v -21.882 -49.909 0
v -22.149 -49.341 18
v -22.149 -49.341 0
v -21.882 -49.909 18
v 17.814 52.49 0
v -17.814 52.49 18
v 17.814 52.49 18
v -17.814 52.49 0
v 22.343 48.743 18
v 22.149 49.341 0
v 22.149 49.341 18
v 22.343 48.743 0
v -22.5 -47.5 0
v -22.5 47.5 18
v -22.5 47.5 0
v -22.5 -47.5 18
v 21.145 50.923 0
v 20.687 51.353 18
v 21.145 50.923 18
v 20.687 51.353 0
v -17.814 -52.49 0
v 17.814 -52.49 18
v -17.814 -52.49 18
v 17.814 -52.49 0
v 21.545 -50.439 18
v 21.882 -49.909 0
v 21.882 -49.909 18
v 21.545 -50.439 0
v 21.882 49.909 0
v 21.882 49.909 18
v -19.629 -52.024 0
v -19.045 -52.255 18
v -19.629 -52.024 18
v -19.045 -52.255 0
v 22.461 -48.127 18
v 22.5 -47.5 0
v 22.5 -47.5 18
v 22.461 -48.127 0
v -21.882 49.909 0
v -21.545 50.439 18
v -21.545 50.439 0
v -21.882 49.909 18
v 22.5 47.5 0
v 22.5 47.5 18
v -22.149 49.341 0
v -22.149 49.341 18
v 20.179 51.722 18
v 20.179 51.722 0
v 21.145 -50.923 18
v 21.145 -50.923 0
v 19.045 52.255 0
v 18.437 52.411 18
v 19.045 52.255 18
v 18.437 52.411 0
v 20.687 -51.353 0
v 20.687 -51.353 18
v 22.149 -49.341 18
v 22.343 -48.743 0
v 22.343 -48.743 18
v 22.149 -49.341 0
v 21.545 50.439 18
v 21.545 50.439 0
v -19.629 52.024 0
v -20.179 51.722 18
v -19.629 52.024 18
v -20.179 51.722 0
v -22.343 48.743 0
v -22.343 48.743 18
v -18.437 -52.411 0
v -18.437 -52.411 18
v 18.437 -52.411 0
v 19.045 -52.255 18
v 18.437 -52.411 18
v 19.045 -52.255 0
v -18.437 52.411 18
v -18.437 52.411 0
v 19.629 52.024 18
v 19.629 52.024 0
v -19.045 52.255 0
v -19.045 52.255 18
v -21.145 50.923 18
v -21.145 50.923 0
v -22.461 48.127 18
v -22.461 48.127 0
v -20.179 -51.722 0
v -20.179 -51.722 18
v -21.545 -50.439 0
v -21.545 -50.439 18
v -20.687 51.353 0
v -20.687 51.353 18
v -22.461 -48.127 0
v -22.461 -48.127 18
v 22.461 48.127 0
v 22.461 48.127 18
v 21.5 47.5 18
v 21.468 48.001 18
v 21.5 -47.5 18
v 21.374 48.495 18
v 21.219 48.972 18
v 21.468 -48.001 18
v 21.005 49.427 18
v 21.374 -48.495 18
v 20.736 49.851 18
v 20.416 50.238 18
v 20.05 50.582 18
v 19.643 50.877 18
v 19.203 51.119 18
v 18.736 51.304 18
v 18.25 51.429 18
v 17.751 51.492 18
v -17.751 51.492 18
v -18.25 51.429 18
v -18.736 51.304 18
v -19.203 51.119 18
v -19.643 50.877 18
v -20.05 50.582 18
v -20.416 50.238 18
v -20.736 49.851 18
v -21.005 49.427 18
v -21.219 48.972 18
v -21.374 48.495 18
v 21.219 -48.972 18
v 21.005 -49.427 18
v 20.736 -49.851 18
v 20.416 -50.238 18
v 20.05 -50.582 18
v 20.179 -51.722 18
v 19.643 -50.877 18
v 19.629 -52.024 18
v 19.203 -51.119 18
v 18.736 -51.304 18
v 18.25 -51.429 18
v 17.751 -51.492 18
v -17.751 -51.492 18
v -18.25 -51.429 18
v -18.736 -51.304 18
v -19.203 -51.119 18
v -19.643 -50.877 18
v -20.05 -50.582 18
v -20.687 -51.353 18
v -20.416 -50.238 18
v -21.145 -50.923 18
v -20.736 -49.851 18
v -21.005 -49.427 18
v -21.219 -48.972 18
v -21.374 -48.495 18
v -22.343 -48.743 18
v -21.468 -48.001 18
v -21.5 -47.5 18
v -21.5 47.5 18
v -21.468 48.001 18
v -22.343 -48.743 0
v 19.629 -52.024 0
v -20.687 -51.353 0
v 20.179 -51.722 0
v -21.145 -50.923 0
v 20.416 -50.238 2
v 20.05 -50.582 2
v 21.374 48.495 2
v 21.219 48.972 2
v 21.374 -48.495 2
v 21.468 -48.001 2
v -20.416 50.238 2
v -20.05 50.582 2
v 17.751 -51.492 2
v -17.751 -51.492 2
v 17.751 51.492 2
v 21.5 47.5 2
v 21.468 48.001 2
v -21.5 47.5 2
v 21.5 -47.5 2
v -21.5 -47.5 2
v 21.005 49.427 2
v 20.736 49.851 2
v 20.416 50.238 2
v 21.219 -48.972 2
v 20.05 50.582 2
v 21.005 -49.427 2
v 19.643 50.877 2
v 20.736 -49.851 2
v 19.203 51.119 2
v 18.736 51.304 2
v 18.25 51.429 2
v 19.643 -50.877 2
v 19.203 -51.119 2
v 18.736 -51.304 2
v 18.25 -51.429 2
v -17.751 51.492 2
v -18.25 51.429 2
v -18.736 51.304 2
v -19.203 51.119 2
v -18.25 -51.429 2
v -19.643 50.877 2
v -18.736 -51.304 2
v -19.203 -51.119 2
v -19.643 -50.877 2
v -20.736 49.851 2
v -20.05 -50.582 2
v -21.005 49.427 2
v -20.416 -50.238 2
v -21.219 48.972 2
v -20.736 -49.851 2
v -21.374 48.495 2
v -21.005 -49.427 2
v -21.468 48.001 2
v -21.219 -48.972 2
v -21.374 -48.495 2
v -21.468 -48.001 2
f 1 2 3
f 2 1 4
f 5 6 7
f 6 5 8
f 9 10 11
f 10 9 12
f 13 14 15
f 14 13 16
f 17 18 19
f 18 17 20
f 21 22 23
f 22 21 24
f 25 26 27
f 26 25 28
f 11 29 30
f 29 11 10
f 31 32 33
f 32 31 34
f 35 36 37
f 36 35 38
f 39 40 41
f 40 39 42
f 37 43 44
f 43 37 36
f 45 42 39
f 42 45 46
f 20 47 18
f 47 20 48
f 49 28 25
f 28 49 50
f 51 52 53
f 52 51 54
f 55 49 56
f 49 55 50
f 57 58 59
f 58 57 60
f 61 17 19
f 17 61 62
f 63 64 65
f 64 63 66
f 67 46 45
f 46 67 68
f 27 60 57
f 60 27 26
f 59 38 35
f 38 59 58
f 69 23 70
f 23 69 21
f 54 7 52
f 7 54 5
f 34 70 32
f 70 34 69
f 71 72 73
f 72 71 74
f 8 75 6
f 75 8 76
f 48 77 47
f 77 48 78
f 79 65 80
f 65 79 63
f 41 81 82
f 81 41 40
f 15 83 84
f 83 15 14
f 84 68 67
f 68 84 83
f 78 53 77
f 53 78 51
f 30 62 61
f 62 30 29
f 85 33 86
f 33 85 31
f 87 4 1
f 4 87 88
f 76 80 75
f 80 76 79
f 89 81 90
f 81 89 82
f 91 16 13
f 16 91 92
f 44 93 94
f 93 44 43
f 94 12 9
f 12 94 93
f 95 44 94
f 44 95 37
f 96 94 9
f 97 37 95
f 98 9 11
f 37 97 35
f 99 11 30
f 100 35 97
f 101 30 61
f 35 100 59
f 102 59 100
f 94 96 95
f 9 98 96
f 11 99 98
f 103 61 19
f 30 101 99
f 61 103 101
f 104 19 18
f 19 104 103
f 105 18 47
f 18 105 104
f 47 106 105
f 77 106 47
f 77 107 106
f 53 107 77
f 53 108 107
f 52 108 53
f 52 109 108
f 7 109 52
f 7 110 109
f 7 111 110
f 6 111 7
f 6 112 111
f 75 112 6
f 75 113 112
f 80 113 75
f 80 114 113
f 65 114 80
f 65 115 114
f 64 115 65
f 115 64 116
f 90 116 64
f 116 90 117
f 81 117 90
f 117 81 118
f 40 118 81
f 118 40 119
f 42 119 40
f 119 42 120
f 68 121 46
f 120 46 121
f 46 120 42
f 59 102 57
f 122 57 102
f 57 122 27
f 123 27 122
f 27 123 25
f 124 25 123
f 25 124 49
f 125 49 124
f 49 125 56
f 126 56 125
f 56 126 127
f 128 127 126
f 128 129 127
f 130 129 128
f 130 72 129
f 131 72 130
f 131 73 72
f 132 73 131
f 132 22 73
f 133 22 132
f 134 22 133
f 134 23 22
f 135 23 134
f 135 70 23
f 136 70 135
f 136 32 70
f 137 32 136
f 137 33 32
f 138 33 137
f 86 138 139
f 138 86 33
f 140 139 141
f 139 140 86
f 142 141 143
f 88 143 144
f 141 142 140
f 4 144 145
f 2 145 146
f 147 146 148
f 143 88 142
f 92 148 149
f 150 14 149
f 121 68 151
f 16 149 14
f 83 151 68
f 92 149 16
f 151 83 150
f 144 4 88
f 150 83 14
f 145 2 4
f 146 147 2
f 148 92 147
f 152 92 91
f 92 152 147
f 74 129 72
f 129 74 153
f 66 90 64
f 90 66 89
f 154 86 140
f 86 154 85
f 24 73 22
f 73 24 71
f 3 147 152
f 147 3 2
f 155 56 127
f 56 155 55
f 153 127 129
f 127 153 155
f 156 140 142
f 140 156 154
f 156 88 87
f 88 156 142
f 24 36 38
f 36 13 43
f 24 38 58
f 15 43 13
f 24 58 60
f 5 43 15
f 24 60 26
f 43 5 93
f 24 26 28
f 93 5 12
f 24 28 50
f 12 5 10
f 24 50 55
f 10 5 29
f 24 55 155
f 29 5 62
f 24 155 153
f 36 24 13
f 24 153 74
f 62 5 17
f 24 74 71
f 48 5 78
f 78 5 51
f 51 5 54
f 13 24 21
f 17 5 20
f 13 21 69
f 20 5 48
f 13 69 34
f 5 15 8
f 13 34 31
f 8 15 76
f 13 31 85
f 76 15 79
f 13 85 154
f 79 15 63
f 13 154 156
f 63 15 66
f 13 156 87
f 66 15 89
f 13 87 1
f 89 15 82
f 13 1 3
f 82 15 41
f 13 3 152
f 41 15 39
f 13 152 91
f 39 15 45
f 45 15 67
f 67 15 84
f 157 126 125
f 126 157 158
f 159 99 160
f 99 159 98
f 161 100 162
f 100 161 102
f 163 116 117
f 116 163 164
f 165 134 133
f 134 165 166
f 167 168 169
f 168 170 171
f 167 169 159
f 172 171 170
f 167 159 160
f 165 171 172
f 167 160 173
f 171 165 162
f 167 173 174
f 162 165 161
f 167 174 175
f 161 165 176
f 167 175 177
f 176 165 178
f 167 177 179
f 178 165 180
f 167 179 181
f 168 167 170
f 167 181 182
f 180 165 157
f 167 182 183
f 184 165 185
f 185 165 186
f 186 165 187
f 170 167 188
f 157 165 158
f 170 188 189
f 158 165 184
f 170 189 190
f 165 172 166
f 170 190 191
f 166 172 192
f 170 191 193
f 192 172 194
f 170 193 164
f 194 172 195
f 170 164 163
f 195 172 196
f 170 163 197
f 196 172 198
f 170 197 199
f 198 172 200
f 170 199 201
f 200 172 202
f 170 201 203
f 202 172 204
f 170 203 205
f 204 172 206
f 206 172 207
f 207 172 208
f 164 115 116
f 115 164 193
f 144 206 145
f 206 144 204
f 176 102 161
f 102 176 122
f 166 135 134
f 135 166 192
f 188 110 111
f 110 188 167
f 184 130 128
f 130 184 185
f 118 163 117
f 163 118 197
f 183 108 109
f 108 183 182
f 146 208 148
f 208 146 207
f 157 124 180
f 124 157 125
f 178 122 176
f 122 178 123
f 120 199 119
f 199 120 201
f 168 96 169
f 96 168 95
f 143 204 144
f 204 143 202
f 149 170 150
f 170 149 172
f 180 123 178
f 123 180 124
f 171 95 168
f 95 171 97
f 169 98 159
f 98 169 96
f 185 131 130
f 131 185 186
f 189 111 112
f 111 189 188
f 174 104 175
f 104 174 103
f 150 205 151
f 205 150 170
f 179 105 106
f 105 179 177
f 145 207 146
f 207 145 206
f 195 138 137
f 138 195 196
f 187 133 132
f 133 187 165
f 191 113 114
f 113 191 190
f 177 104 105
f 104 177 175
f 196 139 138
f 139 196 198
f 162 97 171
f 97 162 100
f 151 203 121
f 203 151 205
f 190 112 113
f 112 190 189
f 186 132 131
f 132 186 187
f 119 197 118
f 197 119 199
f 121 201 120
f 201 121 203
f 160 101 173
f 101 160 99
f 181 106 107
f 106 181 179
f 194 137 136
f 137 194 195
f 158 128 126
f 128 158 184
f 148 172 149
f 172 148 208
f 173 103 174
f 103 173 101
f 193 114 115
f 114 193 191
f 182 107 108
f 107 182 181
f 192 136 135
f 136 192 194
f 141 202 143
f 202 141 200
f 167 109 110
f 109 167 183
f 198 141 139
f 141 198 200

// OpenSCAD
$fn = 50;


difference() {
	union() {
		hull() {
			translate(v = [-17.5000000000, 47.5000000000, 0]) {
				cylinder(h = 18, r = 5);
			}
			translate(v = [17.5000000000, 47.5000000000, 0]) {
				cylinder(h = 18, r = 5);
			}
			translate(v = [-17.5000000000, -47.5000000000, 0]) {
				cylinder(h = 18, r = 5);
			}
			translate(v = [17.5000000000, -47.5000000000, 0]) {
				cylinder(h = 18, r = 5);
			}
		}
	}
	union() {
		translate(v = [0, 0, 2]) {
			hull() {
				translate(v = [-17.5000000000, 47.5000000000, 0]) {
					cylinder(h = 16, r = 4);
				}
				translate(v = [17.5000000000, 47.5000000000, 0]) {
					cylinder(h = 16, r = 4);
				}
				translate(v = [-17.5000000000, -47.5000000000, 0]) {
					cylinder(h = 16, r = 4);
				}
				translate(v = [17.5000000000, -47.5000000000, 0]) {
					cylinder(h = 16, r = 4);
				}
			}
		}
	}
}
